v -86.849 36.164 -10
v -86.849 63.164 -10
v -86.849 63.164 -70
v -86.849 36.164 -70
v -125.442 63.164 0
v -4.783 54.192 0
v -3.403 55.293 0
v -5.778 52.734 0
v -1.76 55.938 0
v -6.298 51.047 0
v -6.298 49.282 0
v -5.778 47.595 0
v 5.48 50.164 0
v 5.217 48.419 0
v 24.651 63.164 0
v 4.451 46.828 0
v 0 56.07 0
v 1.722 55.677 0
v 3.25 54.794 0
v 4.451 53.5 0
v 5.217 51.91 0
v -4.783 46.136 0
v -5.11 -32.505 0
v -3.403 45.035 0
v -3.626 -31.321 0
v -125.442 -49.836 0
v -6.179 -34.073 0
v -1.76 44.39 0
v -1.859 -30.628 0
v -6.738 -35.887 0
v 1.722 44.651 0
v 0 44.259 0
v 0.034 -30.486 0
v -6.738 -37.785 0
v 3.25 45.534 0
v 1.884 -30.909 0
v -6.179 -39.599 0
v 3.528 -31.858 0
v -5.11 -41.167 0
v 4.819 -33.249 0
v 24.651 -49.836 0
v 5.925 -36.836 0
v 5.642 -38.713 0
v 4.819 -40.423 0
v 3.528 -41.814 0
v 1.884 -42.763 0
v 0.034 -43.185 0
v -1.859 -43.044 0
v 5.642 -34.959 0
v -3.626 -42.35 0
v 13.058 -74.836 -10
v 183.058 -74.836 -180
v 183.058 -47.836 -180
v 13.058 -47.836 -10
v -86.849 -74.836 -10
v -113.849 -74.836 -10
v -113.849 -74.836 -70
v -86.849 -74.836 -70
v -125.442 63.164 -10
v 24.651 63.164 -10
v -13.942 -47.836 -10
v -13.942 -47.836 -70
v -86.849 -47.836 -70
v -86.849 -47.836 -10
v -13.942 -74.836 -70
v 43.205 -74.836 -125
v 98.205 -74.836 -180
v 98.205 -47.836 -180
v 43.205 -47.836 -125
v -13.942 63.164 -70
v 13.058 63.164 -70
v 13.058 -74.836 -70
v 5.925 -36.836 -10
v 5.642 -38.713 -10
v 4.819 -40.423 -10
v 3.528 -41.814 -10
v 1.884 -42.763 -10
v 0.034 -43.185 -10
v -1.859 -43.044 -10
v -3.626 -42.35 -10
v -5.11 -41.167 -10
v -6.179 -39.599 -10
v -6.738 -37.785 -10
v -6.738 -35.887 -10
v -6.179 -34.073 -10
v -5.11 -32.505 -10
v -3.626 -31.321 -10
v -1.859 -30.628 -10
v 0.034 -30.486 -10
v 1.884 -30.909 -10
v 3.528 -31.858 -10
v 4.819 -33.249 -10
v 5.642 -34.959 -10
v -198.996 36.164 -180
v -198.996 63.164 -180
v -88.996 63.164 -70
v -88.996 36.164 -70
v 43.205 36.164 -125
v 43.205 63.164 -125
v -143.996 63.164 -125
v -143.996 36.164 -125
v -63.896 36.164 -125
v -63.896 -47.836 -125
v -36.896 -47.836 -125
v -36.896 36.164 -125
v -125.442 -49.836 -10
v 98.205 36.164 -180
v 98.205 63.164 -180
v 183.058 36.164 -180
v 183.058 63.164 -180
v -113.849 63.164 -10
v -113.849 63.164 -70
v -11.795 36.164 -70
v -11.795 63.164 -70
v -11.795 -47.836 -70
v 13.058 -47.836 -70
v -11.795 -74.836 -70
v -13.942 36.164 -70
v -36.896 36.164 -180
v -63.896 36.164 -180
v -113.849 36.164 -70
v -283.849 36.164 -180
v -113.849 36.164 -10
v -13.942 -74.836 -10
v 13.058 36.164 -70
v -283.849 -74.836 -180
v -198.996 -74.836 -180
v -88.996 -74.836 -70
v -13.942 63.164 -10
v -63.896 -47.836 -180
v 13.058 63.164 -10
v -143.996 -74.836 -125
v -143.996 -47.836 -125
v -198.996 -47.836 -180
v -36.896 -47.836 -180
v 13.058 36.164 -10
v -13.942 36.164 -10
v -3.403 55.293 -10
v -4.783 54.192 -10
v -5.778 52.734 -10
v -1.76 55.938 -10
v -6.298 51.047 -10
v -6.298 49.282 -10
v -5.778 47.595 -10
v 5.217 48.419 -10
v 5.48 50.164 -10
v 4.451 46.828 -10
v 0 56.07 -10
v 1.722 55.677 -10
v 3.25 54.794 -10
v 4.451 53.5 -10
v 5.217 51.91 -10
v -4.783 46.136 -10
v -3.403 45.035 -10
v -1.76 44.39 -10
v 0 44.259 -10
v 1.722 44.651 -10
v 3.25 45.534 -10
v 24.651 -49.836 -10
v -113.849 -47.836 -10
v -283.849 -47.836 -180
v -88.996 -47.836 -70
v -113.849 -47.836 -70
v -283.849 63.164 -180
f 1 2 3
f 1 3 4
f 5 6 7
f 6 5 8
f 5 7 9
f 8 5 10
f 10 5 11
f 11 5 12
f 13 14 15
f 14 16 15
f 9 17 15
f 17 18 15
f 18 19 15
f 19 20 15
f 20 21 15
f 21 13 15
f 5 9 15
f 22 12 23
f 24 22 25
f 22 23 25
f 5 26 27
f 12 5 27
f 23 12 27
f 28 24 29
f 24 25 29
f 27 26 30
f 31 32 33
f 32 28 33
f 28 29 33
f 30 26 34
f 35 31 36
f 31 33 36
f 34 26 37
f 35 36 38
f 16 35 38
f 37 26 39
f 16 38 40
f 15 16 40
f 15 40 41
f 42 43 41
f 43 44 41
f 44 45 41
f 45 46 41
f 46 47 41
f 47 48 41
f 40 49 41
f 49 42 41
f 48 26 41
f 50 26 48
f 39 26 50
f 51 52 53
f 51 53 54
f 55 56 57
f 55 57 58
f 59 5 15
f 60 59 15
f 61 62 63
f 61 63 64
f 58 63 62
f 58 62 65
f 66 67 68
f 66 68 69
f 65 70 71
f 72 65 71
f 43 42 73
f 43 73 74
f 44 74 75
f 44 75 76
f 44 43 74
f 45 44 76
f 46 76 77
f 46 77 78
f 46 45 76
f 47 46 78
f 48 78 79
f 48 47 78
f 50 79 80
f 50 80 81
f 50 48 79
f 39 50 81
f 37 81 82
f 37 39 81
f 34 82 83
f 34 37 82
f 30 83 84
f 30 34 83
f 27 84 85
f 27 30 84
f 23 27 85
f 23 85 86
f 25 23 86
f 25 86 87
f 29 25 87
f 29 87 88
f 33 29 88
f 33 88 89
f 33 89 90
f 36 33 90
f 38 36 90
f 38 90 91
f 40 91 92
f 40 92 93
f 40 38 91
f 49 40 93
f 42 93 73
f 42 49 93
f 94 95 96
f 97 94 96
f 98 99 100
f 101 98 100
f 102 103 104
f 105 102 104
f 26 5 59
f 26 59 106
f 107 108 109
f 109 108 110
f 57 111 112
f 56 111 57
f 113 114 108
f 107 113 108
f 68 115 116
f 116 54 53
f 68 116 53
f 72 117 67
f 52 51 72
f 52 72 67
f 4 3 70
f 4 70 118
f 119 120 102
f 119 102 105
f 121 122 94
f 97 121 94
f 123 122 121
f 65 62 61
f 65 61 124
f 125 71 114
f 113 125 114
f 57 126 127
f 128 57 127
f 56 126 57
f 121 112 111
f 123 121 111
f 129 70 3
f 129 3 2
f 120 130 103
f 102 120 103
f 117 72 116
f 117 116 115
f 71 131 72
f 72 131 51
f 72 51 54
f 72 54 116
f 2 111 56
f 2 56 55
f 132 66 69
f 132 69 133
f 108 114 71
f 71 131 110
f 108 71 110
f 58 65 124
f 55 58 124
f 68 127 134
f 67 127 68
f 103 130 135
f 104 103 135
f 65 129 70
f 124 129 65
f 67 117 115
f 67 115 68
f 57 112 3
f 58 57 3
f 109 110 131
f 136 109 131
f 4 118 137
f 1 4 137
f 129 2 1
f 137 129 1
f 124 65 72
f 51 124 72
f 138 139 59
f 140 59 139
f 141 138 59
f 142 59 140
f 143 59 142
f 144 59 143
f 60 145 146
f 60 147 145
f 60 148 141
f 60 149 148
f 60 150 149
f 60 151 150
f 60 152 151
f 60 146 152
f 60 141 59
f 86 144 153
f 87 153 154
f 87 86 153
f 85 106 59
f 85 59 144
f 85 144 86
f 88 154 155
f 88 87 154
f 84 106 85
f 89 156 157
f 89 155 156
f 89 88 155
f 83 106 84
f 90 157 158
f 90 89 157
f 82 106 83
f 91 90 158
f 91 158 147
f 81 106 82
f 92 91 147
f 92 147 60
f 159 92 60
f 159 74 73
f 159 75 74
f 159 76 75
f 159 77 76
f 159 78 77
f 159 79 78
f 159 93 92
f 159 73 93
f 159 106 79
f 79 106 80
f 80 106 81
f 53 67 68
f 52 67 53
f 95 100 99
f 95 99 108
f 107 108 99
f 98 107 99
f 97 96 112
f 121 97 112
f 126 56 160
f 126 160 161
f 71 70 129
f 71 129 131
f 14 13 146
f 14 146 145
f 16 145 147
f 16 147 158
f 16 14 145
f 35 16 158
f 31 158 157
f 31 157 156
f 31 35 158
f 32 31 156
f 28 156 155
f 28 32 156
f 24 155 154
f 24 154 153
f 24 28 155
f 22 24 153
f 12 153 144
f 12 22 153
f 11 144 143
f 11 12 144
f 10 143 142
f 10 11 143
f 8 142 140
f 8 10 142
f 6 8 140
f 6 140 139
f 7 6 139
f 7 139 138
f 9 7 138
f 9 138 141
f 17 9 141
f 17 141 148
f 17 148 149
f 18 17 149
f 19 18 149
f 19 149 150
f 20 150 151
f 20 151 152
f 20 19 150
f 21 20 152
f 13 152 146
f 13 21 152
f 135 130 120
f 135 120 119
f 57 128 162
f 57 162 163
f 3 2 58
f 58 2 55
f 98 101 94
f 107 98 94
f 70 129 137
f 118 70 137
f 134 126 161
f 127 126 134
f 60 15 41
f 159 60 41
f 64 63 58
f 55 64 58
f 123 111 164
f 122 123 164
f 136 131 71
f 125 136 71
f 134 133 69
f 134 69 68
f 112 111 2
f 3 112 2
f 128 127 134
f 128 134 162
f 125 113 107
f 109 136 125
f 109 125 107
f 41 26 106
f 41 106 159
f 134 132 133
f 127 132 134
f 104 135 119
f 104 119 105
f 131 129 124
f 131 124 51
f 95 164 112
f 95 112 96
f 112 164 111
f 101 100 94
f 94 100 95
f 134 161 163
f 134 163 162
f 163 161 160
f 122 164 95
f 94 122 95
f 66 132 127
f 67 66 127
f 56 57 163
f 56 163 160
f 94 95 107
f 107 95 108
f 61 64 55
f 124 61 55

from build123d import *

# Parameters (mm, degrees)
F2_W      = 150
F2_H      = 27
F2_R      = 5.9222192763
F3_DEPTH  = 60
F2_R_2    = 6.3674200107
F4_W      = 150.093134014
F4_H      = 113
F4_R      = 5.9222192763
F4_R_2    = 6.3674200107
F5_DEPTH  = 10
F7_W      = 27
F7_H      = 138
F8_DEPTH  = 60
F10_DEPTH = 27
F12_DEPTH = 27
F14_DEPTH = 27
F17_W     = 27
F17_H     = 55
F18_DEPTH = 84
F19_W     = 27
F19_H     = 60
F20_DEPTH = 72.906865986


with BuildPart() as f3:
    # F2 (on Top) → F3 (new body)
    with BuildSketch(Plane.XY):
        with Locations((-50.4420745202, 49.6641933283)):
            Rectangle(F2_W, F2_H)
        with Locations((-0.4420745202, 50.1641933283)):
            Circle(F2_R, mode=Mode.SUBTRACT)
    extrude(amount=F3_DEPTH)


with BuildPart() as f3b:
    # F2 (on Top) → F3, piece 2 (new body)
    with BuildSketch(Plane.XY):
        with Locations((-50.4420745202, -36.3358066717)):
            Rectangle(F2_W, F2_H)
        with Locations((-0.4420745202, -36.8358066717)):
            Circle(F2_R_2, mode=Mode.SUBTRACT)
    extrude(amount=F3_DEPTH)


with BuildPart() as f5:
    # F4 (on face) → F5 (new body)
    with BuildSketch(Plane(origin=(0, 0, 0), x_dir=(1, 0, 0), z_dir=(0, 0, -1))):
        with Locations((-50.3955075132, -6.6641933283)):
            Rectangle(F4_W, F4_H)
        with Locations((-0.4420745202, -50.1641933283)):
            Circle(F4_R, mode=Mode.SUBTRACT)
        with Locations((-0.4420745202, 36.8358066717)):
            Circle(F4_R_2, mode=Mode.SUBTRACT)
    extrude(amount=F5_DEPTH)


with BuildPart() as f8:
    # F7 (on face) → F8 (new body)
    with BuildSketch(Plane(origin=(0, 0, -10), x_dir=(1, 0, 0), z_dir=(0, 0, -1))):
        with Locations((-0.4420745202, 5.8358066717)):
            Rectangle(F7_W, F7_H)
    extrude(amount=F8_DEPTH)


with BuildPart() as f8b:
    # F7 (on face) → F8, piece 2 (new body)
    with BuildSketch(Plane(origin=(0, 0, -10), x_dir=(1, 0, 0), z_dir=(0, 0, -1))):
        with Locations((-100.3489405062, 5.8358066717)):
            Rectangle(F7_W, F7_H)
    extrude(amount=F8_DEPTH)


with BuildPart() as f10:
    # F9 (on face) → F10 (new body)
    with BuildSketch(Plane.XZ.offset(74.8358066717)):
        Polygon((183.0579254798, -180), (13.0579254798, -10), (13.0579254798, -70), (-11.7948882626, -70), (98.2051117374, -180), align=None)
    extrude(amount=-F10_DEPTH)


with BuildPart() as f12:
    # F11 (on face) → F12 (new body)
    with BuildSketch(Plane.XZ.offset(74.8358066717)):
        Polygon((-113.8489405062, -70), (-113.8489405062, -10), (-283.8489405062, -180), (-198.9961267638, -180), (-88.9961267638, -70), align=None)
    extrude(amount=-F12_DEPTH)


with BuildPart() as f14:
    # F13 (on face) → F14 (new body)
    with BuildSketch(Plane.XZ.offset(74.8358066717)):
        Polygon((-143.9961267638, -125), (-198.9961267638, -180), (98.2048732362, -180), (43.2048732362, -125), align=None)
    extrude(amount=-F14_DEPTH)


with BuildPart() as f16_1:
    # F16: instance of F12
    add(f12.part.mirror(Plane(origin=(-50.3956267638, -5.8358066717, -154.5816043974), x_dir=(1, 0, 0), z_dir=(0, -1, 0))))


with BuildPart() as f16_2:
    # F16: instance of F14
    add(f14.part.mirror(Plane(origin=(-50.3956267638, -5.8358066717, -154.5816043974), x_dir=(1, 0, 0), z_dir=(0, -1, 0))))


with BuildPart() as f16_3:
    # F16: instance of F10
    add(f10.part.mirror(Plane(origin=(-50.3956267638, -5.8358066717, -154.5816043974), x_dir=(1, 0, 0), z_dir=(0, -1, 0))))


with BuildPart() as f18:
    # F17 (on face) → F18 (new body, through all)
    with BuildSketch(Plane.XZ.offset(-36.1641933283)):
        with Locations((-50.3956267638, -152.5)):
            Rectangle(F17_W, F17_H)
    extrude(amount=F18_DEPTH)


with BuildPart() as f20:
    # F19 (on face) → F20 (new body, through all)
    with BuildSketch(Plane(origin=(-13.9420745202, 0, 0), x_dir=(0, -1, 0), z_dir=(-1, 0, 0))):
        with Locations((61.3358066717, -40)):
            Rectangle(F19_W, F19_H)
    extrude(amount=F20_DEPTH)


with BuildPart() as f20b:
    # F19 (on face) → F20, piece 2 (new body, through all)
    with BuildSketch(Plane(origin=(-13.9420745202, 0, 0), x_dir=(0, -1, 0), z_dir=(-1, 0, 0))):
        with Locations((-49.6641933283, -40)):
            Rectangle(F19_W, F19_H)
    extrude(amount=F20_DEPTH)


solid = Compound([f5.part, f8.part, f8b.part, f10.part, f12.part, f14.part, f16_1.part, f16_2.part, f16_3.part, f18.part, f20.part, f20b.part])
